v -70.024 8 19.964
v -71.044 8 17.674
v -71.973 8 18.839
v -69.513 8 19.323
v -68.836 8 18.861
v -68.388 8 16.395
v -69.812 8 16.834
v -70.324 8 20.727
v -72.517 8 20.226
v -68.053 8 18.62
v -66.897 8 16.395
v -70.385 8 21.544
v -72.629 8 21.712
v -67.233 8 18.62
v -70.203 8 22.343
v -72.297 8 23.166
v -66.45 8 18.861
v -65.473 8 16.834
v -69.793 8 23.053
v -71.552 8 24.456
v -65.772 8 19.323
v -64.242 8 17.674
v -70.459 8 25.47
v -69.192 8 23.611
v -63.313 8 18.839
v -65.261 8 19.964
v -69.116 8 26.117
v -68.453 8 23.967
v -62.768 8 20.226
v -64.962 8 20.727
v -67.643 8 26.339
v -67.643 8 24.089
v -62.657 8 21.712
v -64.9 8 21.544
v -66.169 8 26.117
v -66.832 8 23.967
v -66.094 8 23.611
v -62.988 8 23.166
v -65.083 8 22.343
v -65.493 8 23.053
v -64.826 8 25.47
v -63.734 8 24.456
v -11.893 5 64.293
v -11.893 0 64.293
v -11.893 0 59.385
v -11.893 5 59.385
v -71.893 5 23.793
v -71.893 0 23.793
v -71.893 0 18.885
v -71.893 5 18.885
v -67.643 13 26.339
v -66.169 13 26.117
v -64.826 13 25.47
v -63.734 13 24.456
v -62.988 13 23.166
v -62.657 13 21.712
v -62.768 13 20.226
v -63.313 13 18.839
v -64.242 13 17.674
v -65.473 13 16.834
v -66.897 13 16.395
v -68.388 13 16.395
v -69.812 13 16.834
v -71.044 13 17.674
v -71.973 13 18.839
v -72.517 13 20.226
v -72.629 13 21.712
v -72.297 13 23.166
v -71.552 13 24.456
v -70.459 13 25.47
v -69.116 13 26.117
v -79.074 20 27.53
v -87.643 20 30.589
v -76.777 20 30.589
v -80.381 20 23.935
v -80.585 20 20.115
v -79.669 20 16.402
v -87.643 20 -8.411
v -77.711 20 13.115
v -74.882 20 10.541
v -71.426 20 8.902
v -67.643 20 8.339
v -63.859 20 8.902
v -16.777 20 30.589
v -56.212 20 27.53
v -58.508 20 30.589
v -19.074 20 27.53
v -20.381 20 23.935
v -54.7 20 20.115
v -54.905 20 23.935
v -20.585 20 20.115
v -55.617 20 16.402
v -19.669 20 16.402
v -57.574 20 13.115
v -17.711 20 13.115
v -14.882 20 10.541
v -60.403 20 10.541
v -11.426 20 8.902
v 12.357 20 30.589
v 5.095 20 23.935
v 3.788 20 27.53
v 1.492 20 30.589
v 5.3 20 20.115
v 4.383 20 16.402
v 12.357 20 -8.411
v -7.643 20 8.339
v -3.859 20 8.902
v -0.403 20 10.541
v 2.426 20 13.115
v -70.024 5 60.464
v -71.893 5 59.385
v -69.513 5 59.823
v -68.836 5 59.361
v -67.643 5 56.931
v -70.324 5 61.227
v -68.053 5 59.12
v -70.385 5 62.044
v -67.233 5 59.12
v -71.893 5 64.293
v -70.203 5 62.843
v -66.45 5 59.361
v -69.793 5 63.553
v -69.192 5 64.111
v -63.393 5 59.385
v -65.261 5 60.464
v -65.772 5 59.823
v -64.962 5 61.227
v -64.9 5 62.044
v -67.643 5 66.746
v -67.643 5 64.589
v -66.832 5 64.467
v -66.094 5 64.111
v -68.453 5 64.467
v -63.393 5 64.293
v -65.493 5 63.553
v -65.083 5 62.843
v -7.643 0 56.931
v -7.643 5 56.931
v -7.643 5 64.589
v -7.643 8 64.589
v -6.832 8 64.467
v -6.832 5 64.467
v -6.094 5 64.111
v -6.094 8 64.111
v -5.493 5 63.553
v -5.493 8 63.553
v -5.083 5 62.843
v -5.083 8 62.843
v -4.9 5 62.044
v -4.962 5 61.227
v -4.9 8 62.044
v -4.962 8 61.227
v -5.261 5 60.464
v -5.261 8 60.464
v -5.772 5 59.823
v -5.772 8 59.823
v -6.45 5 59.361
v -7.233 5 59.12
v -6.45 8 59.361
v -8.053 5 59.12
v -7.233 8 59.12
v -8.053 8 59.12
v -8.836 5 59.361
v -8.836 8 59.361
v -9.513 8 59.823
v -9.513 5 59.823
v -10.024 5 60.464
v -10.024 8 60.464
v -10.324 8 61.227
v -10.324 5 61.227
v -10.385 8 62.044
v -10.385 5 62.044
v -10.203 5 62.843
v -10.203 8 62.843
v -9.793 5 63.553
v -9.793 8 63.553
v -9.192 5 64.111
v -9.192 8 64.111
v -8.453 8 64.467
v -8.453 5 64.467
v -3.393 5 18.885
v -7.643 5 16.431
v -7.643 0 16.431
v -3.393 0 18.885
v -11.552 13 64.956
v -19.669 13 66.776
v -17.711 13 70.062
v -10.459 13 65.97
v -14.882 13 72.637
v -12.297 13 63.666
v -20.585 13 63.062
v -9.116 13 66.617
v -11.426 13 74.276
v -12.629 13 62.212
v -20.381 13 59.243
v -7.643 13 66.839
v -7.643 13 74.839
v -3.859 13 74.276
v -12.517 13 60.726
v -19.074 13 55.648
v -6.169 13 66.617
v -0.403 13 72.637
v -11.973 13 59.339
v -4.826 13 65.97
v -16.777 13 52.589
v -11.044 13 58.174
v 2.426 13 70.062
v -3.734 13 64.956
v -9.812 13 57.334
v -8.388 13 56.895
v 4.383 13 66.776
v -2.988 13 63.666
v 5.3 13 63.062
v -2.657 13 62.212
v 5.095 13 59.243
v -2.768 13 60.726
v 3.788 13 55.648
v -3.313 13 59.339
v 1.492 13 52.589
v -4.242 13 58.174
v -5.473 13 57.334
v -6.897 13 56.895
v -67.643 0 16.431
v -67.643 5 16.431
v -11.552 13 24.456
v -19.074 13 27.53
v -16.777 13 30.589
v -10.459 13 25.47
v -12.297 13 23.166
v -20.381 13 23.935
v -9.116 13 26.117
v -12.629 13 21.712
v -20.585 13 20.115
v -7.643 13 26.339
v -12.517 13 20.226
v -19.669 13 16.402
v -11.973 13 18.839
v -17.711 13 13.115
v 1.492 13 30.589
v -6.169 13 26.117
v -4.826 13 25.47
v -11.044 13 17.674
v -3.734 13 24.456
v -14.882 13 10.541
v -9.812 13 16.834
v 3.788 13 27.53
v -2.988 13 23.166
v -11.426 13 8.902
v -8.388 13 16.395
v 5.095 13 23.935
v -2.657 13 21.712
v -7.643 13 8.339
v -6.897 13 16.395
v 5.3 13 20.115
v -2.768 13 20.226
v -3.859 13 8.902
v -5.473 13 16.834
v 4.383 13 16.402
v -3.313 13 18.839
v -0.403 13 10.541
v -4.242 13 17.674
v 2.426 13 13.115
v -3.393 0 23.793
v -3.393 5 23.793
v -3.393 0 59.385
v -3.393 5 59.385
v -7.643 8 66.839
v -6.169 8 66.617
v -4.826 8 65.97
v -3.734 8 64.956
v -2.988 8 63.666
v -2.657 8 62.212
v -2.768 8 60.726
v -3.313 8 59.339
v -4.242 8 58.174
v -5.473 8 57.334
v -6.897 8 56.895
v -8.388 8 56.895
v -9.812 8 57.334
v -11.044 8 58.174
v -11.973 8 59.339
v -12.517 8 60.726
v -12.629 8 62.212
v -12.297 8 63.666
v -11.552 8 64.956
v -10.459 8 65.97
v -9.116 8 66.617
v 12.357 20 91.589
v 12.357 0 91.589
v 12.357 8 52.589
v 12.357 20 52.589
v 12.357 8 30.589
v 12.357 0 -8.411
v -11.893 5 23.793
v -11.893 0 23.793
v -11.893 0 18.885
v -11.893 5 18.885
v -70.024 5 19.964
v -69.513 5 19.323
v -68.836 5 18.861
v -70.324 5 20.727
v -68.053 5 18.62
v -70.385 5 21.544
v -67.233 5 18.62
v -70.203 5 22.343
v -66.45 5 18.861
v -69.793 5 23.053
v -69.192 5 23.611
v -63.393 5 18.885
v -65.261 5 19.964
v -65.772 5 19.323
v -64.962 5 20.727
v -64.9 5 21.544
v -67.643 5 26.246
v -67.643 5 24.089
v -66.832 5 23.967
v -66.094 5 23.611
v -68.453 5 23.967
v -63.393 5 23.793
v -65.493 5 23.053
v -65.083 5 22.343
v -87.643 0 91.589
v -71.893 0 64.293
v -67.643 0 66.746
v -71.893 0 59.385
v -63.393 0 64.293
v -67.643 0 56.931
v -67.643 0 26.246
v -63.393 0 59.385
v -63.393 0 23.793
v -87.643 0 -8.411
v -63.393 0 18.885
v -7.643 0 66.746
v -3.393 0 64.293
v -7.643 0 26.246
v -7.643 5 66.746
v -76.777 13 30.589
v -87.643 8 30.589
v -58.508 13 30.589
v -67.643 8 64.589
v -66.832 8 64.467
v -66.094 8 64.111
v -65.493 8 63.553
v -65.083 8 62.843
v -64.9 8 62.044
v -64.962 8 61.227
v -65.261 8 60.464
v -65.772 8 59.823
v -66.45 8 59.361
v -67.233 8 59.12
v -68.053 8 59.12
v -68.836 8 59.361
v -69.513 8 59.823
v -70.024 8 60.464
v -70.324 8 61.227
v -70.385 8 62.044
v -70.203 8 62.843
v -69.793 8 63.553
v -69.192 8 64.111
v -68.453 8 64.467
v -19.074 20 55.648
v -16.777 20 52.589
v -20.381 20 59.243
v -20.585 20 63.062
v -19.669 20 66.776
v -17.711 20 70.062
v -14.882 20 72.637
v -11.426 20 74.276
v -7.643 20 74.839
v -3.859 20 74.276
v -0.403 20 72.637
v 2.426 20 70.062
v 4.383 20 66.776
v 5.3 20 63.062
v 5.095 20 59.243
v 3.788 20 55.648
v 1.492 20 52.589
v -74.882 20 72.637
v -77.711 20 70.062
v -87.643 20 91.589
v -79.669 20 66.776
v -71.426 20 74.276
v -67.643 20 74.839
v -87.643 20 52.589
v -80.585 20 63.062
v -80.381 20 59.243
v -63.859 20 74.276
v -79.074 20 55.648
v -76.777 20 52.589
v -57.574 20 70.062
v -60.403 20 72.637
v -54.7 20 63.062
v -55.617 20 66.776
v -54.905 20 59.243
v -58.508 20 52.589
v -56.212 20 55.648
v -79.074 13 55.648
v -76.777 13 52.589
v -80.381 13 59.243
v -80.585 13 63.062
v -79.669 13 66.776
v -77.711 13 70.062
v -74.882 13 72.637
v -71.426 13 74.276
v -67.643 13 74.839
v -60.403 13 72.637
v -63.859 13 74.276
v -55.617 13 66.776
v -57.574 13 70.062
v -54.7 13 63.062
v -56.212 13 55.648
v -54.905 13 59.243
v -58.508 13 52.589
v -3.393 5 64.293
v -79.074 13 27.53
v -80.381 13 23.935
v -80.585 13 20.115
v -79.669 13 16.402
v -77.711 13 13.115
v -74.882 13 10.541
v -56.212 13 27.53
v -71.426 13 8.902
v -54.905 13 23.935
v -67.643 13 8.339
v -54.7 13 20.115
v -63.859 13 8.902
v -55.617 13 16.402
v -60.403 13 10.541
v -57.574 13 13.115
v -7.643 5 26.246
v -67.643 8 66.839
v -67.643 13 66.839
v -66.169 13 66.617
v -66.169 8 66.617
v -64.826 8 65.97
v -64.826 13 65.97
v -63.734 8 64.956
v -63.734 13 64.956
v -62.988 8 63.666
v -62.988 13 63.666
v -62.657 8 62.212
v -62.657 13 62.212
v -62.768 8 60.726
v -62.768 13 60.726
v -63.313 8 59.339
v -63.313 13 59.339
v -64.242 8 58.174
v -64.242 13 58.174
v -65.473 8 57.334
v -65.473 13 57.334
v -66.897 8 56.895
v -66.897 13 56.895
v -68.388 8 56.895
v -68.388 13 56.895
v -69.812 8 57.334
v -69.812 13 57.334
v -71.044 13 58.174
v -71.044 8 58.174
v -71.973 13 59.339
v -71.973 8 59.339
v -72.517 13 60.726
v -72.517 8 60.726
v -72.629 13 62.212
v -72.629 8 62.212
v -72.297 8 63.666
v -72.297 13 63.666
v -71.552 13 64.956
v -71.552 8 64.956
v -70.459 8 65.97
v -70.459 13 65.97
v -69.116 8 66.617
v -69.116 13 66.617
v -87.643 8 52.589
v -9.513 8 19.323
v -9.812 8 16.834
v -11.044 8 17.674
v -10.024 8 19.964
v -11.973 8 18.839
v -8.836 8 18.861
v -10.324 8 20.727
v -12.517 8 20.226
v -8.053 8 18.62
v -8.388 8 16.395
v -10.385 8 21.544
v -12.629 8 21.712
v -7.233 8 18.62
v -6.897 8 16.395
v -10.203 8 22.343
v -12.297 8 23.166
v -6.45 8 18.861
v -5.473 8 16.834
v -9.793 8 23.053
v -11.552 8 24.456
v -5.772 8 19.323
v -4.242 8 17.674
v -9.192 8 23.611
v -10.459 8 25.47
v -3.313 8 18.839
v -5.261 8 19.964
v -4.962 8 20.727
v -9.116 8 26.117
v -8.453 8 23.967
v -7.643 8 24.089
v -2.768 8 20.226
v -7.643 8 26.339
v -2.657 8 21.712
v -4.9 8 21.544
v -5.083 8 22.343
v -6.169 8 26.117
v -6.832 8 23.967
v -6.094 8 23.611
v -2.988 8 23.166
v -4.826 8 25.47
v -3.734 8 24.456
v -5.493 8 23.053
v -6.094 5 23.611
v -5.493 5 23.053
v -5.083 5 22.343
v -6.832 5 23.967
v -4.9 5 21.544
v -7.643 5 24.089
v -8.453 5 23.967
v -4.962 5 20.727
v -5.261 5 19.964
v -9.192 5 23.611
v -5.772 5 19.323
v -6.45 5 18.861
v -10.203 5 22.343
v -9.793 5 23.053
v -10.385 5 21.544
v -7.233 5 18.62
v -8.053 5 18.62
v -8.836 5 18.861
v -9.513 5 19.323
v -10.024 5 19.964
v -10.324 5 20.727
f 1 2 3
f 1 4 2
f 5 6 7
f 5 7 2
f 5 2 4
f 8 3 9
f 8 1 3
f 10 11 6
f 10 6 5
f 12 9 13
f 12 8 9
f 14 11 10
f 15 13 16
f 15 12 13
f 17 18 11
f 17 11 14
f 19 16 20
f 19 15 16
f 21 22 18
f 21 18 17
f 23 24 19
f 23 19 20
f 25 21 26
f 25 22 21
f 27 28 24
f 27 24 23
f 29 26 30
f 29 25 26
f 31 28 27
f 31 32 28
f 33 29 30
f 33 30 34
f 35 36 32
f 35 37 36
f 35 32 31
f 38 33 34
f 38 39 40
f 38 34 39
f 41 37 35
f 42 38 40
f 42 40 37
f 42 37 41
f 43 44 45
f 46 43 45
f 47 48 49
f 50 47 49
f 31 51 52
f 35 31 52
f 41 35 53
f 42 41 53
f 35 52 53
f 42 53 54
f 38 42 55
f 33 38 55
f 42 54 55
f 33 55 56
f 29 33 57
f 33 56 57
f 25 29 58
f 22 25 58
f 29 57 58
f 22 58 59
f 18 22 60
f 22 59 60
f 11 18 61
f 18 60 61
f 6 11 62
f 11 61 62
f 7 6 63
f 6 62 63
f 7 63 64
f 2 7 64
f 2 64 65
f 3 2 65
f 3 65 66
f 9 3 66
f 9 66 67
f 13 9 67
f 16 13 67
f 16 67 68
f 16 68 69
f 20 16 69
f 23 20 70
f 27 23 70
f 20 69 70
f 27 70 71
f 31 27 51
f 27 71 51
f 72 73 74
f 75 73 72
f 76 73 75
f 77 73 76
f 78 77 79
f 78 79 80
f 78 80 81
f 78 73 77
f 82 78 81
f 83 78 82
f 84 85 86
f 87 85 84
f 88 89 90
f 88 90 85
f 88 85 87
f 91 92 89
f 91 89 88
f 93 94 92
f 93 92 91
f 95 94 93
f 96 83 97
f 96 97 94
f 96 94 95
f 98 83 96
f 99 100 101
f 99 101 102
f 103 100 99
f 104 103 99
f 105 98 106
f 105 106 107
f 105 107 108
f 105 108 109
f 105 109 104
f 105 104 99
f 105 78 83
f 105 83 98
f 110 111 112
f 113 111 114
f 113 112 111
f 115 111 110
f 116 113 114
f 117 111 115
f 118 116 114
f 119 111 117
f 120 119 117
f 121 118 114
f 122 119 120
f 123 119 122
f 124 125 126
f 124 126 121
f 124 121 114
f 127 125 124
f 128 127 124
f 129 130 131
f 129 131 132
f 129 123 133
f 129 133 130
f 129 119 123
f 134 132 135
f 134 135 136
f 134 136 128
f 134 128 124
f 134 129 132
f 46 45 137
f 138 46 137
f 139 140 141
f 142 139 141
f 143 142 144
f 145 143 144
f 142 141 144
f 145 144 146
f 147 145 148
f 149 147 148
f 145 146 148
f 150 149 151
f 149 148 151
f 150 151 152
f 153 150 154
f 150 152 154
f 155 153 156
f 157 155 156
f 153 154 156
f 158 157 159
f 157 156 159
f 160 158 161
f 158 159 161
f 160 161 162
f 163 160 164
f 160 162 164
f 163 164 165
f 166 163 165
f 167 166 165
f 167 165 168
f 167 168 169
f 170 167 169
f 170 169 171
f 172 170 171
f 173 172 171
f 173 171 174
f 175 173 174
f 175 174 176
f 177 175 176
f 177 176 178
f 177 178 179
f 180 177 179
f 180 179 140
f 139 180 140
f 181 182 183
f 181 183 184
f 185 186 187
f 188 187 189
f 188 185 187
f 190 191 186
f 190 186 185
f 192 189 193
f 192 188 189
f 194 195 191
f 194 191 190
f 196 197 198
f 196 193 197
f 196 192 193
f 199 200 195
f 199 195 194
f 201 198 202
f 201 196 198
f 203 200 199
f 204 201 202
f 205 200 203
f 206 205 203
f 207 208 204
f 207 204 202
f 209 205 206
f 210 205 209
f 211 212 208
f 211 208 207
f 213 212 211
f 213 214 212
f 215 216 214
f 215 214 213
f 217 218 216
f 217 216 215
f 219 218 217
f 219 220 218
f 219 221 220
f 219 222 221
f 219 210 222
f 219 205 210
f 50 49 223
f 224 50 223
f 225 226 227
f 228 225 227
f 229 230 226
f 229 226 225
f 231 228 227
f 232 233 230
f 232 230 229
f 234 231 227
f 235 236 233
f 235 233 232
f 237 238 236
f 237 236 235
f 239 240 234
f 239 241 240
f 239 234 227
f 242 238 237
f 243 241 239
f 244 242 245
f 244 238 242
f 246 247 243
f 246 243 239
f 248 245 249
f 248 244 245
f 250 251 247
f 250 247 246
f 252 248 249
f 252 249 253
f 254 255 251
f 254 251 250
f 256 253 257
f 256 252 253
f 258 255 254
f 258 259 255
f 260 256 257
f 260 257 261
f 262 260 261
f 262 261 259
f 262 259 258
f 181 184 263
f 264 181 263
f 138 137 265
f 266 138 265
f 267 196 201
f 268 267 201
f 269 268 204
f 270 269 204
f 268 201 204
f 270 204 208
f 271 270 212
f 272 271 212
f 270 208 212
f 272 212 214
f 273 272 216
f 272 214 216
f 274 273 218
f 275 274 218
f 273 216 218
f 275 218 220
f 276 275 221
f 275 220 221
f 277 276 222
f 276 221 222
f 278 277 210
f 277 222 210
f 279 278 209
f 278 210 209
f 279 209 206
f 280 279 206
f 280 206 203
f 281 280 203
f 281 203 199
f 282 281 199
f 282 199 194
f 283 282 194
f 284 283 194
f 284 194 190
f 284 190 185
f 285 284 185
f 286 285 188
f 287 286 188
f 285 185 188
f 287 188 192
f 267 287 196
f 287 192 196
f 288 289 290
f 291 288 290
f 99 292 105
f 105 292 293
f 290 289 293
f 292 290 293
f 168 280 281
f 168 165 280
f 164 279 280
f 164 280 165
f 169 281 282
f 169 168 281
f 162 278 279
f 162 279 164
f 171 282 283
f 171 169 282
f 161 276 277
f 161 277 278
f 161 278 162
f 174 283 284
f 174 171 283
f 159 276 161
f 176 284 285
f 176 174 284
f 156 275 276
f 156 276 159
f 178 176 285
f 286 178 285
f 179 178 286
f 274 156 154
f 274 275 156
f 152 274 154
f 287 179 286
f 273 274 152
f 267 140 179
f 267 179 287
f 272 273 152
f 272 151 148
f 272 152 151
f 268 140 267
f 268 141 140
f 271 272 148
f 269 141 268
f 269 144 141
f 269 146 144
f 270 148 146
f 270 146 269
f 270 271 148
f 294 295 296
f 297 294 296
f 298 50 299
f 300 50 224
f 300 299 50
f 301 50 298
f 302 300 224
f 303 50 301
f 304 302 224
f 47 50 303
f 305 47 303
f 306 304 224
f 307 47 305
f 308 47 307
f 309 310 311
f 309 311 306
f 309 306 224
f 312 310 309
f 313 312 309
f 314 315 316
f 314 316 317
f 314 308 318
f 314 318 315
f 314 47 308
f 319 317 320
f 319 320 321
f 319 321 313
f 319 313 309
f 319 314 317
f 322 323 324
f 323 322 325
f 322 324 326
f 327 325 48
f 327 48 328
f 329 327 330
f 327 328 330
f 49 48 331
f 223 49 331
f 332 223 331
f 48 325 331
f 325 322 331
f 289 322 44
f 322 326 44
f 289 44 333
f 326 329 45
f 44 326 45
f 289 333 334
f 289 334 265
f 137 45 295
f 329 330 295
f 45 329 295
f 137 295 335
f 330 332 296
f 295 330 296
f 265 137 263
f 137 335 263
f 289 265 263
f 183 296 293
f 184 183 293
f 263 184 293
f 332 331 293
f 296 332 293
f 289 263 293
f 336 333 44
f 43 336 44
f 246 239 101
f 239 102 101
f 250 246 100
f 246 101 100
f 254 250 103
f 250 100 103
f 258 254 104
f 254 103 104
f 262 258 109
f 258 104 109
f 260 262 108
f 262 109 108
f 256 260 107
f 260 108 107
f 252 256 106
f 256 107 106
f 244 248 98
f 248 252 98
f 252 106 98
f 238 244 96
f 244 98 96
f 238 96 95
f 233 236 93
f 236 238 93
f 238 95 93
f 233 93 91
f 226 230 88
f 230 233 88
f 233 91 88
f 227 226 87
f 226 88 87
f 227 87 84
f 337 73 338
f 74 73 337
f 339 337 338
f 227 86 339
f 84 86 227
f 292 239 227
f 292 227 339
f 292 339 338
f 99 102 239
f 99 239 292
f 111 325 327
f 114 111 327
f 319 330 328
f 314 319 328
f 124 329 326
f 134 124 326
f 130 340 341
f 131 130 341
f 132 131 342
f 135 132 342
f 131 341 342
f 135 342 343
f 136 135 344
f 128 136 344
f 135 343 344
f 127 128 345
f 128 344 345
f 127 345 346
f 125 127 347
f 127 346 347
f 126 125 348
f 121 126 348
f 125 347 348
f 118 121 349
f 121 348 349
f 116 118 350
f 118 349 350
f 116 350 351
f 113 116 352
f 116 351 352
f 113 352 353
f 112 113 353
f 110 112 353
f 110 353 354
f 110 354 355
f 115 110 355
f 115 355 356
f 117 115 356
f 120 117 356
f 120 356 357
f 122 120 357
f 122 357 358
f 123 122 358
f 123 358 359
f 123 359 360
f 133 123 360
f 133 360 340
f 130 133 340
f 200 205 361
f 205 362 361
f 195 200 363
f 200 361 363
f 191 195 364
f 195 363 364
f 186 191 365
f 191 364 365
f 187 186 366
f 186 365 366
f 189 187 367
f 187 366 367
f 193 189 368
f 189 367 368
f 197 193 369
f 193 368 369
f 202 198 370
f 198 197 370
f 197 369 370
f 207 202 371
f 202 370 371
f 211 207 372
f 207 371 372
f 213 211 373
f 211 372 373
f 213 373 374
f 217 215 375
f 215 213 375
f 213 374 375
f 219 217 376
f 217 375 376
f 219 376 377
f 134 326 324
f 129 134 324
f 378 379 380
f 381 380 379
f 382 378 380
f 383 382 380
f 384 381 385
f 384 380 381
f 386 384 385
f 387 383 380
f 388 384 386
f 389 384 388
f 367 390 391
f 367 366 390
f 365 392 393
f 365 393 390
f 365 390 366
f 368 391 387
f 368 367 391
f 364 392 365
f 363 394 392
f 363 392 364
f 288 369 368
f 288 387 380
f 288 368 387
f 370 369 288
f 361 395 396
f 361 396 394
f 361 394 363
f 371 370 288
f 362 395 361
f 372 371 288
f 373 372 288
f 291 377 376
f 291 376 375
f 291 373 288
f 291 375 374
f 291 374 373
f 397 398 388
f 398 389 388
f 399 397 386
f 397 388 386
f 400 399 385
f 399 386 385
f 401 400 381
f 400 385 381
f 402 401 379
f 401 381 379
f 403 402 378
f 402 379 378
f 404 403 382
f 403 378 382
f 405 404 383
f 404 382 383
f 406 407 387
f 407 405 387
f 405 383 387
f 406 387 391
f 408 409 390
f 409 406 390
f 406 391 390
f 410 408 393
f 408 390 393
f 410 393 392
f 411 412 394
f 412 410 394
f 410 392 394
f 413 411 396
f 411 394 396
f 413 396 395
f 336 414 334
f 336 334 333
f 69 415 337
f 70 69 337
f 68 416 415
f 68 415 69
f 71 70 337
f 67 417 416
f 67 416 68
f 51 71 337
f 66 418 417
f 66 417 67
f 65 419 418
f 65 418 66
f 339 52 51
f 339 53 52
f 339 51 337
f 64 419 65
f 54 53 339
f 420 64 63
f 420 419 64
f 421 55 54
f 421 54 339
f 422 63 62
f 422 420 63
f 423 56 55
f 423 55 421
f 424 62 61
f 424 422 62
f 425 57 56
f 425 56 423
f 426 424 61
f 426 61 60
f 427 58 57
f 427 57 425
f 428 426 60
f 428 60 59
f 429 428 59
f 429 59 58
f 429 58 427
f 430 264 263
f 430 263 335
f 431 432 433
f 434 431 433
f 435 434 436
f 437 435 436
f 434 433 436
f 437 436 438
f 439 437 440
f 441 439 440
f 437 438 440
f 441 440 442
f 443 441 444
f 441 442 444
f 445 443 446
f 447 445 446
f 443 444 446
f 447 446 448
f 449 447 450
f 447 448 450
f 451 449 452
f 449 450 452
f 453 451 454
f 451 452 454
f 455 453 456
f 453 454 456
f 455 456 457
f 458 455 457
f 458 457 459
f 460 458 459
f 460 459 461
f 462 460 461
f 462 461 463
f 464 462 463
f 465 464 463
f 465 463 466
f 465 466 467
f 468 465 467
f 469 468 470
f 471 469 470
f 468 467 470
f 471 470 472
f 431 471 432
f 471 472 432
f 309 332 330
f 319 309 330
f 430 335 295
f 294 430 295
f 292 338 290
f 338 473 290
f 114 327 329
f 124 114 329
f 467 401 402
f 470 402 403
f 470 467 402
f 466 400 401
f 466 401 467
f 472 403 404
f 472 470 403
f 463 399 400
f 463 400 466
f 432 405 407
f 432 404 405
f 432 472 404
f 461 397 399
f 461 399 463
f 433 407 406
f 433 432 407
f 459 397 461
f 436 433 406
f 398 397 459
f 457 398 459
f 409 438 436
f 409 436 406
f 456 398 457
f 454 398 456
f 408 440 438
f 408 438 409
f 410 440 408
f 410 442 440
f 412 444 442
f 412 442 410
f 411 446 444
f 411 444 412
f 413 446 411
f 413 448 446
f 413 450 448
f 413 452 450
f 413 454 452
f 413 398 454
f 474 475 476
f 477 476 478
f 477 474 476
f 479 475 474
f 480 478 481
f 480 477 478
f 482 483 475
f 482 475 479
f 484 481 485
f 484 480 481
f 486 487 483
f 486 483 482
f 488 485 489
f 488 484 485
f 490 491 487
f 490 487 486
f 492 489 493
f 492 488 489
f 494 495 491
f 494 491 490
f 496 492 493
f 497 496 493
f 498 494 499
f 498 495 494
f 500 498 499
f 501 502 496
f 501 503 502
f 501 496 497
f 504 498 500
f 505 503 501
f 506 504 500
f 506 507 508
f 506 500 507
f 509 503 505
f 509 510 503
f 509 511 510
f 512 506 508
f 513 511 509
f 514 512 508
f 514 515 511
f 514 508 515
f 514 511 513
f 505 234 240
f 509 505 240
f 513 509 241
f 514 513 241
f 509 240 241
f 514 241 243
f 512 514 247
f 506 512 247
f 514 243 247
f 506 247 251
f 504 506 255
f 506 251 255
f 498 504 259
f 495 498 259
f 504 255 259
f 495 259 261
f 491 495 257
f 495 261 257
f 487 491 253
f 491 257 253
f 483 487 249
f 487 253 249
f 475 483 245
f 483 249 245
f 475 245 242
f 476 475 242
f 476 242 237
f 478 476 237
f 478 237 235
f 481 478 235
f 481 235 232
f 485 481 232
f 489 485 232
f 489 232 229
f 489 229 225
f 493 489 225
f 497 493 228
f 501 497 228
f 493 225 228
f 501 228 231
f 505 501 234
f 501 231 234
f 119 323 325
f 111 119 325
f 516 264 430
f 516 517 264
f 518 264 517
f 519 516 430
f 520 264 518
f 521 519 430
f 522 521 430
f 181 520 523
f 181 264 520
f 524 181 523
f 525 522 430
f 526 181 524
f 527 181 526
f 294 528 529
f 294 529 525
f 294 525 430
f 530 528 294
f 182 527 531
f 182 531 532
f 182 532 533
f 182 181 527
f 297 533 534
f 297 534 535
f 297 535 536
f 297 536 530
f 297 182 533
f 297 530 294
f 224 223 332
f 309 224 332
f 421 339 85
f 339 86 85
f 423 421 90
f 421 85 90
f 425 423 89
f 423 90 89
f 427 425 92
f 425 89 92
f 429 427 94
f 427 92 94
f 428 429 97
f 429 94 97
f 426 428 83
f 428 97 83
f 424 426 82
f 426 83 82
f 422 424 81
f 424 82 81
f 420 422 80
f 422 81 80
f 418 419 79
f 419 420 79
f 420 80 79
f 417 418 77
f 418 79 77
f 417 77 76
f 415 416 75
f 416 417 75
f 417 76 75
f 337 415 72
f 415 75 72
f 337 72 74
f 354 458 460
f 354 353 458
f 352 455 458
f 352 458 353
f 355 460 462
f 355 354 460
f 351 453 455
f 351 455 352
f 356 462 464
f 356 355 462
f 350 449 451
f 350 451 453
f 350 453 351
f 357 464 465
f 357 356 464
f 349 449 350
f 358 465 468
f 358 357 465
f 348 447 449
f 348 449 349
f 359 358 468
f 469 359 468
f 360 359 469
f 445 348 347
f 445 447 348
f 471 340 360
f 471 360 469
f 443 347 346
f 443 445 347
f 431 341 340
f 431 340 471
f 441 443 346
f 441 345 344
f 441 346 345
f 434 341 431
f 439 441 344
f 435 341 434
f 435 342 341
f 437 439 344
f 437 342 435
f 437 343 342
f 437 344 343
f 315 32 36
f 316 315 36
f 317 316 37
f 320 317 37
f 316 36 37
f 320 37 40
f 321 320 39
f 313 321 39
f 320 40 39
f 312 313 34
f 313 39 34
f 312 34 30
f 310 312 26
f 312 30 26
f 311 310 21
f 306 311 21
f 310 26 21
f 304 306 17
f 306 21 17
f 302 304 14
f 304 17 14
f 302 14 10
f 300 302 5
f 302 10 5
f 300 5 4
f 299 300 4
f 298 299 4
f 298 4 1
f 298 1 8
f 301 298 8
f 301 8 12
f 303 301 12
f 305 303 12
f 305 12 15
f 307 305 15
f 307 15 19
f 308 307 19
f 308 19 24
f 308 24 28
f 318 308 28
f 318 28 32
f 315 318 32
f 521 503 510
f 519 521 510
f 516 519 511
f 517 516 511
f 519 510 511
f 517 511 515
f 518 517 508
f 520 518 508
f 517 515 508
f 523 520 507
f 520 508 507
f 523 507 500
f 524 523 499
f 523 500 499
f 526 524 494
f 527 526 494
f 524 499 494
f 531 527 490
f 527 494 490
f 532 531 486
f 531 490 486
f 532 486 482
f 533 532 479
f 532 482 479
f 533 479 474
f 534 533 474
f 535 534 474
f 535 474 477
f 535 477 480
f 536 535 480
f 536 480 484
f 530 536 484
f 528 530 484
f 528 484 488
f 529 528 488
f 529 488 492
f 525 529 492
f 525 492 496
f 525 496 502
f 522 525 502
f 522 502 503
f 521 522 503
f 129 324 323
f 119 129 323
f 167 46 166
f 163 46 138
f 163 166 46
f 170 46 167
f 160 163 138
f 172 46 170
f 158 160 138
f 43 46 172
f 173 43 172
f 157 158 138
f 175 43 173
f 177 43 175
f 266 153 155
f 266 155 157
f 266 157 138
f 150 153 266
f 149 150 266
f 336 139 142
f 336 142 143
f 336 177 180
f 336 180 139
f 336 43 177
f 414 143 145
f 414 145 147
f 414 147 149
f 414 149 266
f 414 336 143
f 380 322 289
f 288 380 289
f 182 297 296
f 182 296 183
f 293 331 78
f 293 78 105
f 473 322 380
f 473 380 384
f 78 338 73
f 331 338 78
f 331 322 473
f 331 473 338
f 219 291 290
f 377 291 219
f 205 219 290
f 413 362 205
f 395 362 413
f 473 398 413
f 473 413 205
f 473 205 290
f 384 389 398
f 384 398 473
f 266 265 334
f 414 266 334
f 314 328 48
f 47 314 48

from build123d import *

# Parameters (mm, degrees)
SKETCH2_W           = 100
SKETCH2_H           = 100
BOSS_EXTRUDE1_DEPTH = 20
SKETCH3_W           = 100
SKETCH3_H           = 20
CUT_EXTRUDE1_DEPTH  = 12
SKETCH5_R           = 13
CUT_EXTRUDE2_DEPTH  = 7
SKETCH6_R           = 13
CUT_EXTRUDE3_DEPTH  = 7
SKETCH8_R           = 13
CUT_EXTRUDE5_DEPTH  = 7
SKETCH7_R           = 13
CUT_EXTRUDE10_DEPTH = 7
SKETCH13_R          = 2.75
CUT_EXTRUDE11_DEPTH = 128.4313455
SKETCH14_R          = 2.75
CUT_EXTRUDE12_DEPTH = 128.4313455
SKETCH15_R          = 2.75
CUT_EXTRUDE13_DEPTH = 128.4313455
SKETCH16_R          = 2.75
CUT_EXTRUDE14_DEPTH = 128.4313455
CUT_EXTRUDE15_DEPTH = 5
CUT_EXTRUDE16_DEPTH = 5
CUT_EXTRUDE17_DEPTH = 5
CUT_EXTRUDE18_DEPTH = 5
SKETCH22_W          = 100
SKETCH22_H          = 12
CUT_EXTRUDE19_DEPTH = 1
SKETCH23_W          = 100
SKETCH23_H          = 12
CUT_EXTRUDE20_DEPTH = 1
SKETCH24_R          = 5
CUT_EXTRUDE21_DEPTH = 5
SKETCH25_R          = 5
CUT_EXTRUDE22_DEPTH = 5
SKETCH26_R          = 5
CUT_EXTRUDE23_DEPTH = 5
SKETCH27_R          = 5
CUT_EXTRUDE24_DEPTH = 5


with BuildPart() as part:
    # Sketch2 → Boss-Extrude1 (new body)
    with BuildSketch(Plane(origin=(0, 0, 0), x_dir=(1, 0, 0), z_dir=(0, 1, 0))):
        with Locations((-37.64268429, -41.588796838)):
            Rectangle(SKETCH2_W, SKETCH2_H)
    extrude(amount=BOSS_EXTRUDE1_DEPTH)

    # Sketch3 → Cut-Extrude1 (cut)
    with BuildSketch(Plane(origin=(0, 20, 0), x_dir=(1, 0, 0), z_dir=(0, 1, 0))):
        with Locations((-37.64268429, -41.588796838)):
            Rectangle(SKETCH3_W, SKETCH3_H)
    extrude(amount=-CUT_EXTRUDE1_DEPTH, mode=Mode.SUBTRACT)

    # Sketch5 → Cut-Extrude2 (cut)
    with BuildSketch(Plane(origin=(0, 20, 0), x_dir=(1, 0, 0), z_dir=(0, 1, 0))):
        with Locations((-7.64268429, -61.838796838)):
            Circle(SKETCH5_R)
    extrude(amount=-CUT_EXTRUDE2_DEPTH, mode=Mode.SUBTRACT)

    # Sketch6 → Cut-Extrude3 (cut)
    with BuildSketch(Plane(origin=(0, 20, 0), x_dir=(1, 0, 0), z_dir=(0, 1, 0))):
        with Locations((-67.64268429, -61.838796838)):
            Circle(SKETCH6_R)
    extrude(amount=-CUT_EXTRUDE3_DEPTH, mode=Mode.SUBTRACT)

    # Sketch8 → Cut-Extrude5 (cut)
    with BuildSketch(Plane(origin=(0, 20, 0), x_dir=(1, 0, 0), z_dir=(0, 1, 0))):
        with Locations((-7.64268429, -21.338796838)):
            Circle(SKETCH8_R)
    extrude(amount=-CUT_EXTRUDE5_DEPTH, mode=Mode.SUBTRACT)

    # Sketch7 → Cut-Extrude10 (cut)
    with BuildSketch(Plane(origin=(0, 20, 0), x_dir=(1, 0, 0), z_dir=(0, 1, 0))):
        with Locations((-67.64268429, -21.338796838)):
            Circle(SKETCH7_R)
    extrude(amount=-CUT_EXTRUDE10_DEPTH, mode=Mode.SUBTRACT)

    # Sketch13 → Cut-Extrude11 (cut, through all)
    with BuildSketch(Plane(origin=(0, 13, 0), x_dir=(1, 0, 0), z_dir=(0, 1, 0))):
        with Locations(Location((-67.64268429, -21.338796838, 0), (0, 0, 270))):
            Circle(SKETCH13_R)
    extrude(amount=-CUT_EXTRUDE11_DEPTH, mode=Mode.SUBTRACT)

    # Sketch14 → Cut-Extrude12 (cut, through all)
    with BuildSketch(Plane(origin=(0, 13, 0), x_dir=(1, 0, 0), z_dir=(0, 1, 0))):
        with Locations(Location((-7.64268429, -21.338796838, 0), (0, 0, 270))):
            Circle(SKETCH14_R)
    extrude(amount=-CUT_EXTRUDE12_DEPTH, mode=Mode.SUBTRACT)

    # Sketch15 → Cut-Extrude13 (cut, through all)
    with BuildSketch(Plane(origin=(0, 13, 0), x_dir=(1, 0, 0), z_dir=(0, 1, 0))):
        with Locations(Location((-7.64268429, -61.838796838, 0), (0, 0, 270))):
            Circle(SKETCH15_R)
    extrude(amount=-CUT_EXTRUDE13_DEPTH, mode=Mode.SUBTRACT)

    # Sketch16 → Cut-Extrude14 (cut, through all)
    with BuildSketch(Plane(origin=(0, 13, 0), x_dir=(1, 0, 0), z_dir=(0, 1, 0))):
        with Locations(Location((-67.64268429, -61.838796838, 0), (0, 0, 270))):
            Circle(SKETCH16_R)
    extrude(amount=-CUT_EXTRUDE14_DEPTH, mode=Mode.SUBTRACT)

    # Sketch17 → Cut-Extrude15 (cut)
    with BuildSketch(Plane(origin=(0, 0, 0), x_dir=(-1, 0, 0), z_dir=(0, -1, 0))):
        Polygon((7.64268429, -26.246274126), (11.89268429, -23.792535482), (11.89268429, -18.885058194), (7.64268429, -16.43131955), (3.39268429, -18.885058194), (3.39268429, -23.792535482), align=None)
    extrude(amount=-CUT_EXTRUDE15_DEPTH, mode=Mode.SUBTRACT)

    # Sketch19 → Cut-Extrude16 (cut)
    with BuildSketch(Plane.XZ):
        Polygon((-67.64268429, 26.246274126), (-71.89268429, 23.792535482), (-71.89268429, 18.885058194), (-67.64268429, 16.43131955), (-63.39268429, 18.885058194), (-63.39268429, 23.792535482), align=None)
    extrude(amount=-CUT_EXTRUDE16_DEPTH, mode=Mode.SUBTRACT)

    # Sketch20 → Cut-Extrude17 (cut)
    with BuildSketch(Plane.XZ):
        Polygon((-67.64268429, 66.746274126), (-71.89268429, 64.292535482), (-71.89268429, 59.385058194), (-67.64268429, 56.93131955), (-63.39268429, 59.385058194), (-63.39268429, 64.292535482), align=None)
    extrude(amount=-CUT_EXTRUDE17_DEPTH, mode=Mode.SUBTRACT)

    # Sketch21 → Cut-Extrude18 (cut)
    with BuildSketch(Plane.XZ):
        Polygon((-7.64268429, 66.746274126), (-11.89268429, 64.292535482), (-11.89268429, 59.385058194), (-7.64268429, 56.93131955), (-3.39268429, 59.385058194), (-3.39268429, 64.292535482), align=None)
    extrude(amount=-CUT_EXTRUDE18_DEPTH, mode=Mode.SUBTRACT)

    # Sketch22 → Cut-Extrude19 (cut)
    with BuildSketch(Plane.XY.offset(31.588796838)):
        with Locations((-37.64268429, 14)):
            Rectangle(SKETCH22_W, SKETCH22_H)
    extrude(amount=-CUT_EXTRUDE19_DEPTH, mode=Mode.SUBTRACT)

    # Sketch23 → Cut-Extrude20 (cut)
    with BuildSketch(Plane(origin=(0, 0, 51.588796838), x_dir=(-1, 0, 0), z_dir=(0, 0, -1))):
        with Locations((37.64268429, 14)):
            Rectangle(SKETCH23_W, SKETCH23_H)
    extrude(amount=-CUT_EXTRUDE20_DEPTH, mode=Mode.SUBTRACT)

    # Sketch24 → Cut-Extrude21 (cut)
    with BuildSketch(Plane(origin=(0, 13, 0), x_dir=(1, 0, 0), z_dir=(0, 1, 0))):
        with Locations(Location((-67.64268429, -61.838796838, 0), (0, 0, 270))):
            Circle(SKETCH24_R)
    extrude(amount=-CUT_EXTRUDE21_DEPTH, mode=Mode.SUBTRACT)

    # Sketch25 → Cut-Extrude22 (cut)
    with BuildSketch(Plane(origin=(0, 13, 0), x_dir=(1, 0, 0), z_dir=(0, 1, 0))):
        with Locations(Location((-7.64268429, -61.838796838, 0), (0, 0, 270))):
            Circle(SKETCH25_R)
    extrude(amount=-CUT_EXTRUDE22_DEPTH, mode=Mode.SUBTRACT)

    # Sketch26 → Cut-Extrude23 (cut)
    with BuildSketch(Plane(origin=(0, 13, 0), x_dir=(1, 0, 0), z_dir=(0, 1, 0))):
        with Locations(Location((-7.64268429, -21.338796838, 0), (0, 0, 270))):
            Circle(SKETCH26_R)
    extrude(amount=-CUT_EXTRUDE23_DEPTH, mode=Mode.SUBTRACT)

    # Sketch27 → Cut-Extrude24 (cut)
    with BuildSketch(Plane(origin=(0, 13, 0), x_dir=(1, 0, 0), z_dir=(0, 1, 0))):
        with Locations(Location((-67.64268429, -21.338796838, 0), (0, 0, 270))):
            Circle(SKETCH27_R)
    extrude(amount=-CUT_EXTRUDE24_DEPTH, mode=Mode.SUBTRACT)


solid = part.part
